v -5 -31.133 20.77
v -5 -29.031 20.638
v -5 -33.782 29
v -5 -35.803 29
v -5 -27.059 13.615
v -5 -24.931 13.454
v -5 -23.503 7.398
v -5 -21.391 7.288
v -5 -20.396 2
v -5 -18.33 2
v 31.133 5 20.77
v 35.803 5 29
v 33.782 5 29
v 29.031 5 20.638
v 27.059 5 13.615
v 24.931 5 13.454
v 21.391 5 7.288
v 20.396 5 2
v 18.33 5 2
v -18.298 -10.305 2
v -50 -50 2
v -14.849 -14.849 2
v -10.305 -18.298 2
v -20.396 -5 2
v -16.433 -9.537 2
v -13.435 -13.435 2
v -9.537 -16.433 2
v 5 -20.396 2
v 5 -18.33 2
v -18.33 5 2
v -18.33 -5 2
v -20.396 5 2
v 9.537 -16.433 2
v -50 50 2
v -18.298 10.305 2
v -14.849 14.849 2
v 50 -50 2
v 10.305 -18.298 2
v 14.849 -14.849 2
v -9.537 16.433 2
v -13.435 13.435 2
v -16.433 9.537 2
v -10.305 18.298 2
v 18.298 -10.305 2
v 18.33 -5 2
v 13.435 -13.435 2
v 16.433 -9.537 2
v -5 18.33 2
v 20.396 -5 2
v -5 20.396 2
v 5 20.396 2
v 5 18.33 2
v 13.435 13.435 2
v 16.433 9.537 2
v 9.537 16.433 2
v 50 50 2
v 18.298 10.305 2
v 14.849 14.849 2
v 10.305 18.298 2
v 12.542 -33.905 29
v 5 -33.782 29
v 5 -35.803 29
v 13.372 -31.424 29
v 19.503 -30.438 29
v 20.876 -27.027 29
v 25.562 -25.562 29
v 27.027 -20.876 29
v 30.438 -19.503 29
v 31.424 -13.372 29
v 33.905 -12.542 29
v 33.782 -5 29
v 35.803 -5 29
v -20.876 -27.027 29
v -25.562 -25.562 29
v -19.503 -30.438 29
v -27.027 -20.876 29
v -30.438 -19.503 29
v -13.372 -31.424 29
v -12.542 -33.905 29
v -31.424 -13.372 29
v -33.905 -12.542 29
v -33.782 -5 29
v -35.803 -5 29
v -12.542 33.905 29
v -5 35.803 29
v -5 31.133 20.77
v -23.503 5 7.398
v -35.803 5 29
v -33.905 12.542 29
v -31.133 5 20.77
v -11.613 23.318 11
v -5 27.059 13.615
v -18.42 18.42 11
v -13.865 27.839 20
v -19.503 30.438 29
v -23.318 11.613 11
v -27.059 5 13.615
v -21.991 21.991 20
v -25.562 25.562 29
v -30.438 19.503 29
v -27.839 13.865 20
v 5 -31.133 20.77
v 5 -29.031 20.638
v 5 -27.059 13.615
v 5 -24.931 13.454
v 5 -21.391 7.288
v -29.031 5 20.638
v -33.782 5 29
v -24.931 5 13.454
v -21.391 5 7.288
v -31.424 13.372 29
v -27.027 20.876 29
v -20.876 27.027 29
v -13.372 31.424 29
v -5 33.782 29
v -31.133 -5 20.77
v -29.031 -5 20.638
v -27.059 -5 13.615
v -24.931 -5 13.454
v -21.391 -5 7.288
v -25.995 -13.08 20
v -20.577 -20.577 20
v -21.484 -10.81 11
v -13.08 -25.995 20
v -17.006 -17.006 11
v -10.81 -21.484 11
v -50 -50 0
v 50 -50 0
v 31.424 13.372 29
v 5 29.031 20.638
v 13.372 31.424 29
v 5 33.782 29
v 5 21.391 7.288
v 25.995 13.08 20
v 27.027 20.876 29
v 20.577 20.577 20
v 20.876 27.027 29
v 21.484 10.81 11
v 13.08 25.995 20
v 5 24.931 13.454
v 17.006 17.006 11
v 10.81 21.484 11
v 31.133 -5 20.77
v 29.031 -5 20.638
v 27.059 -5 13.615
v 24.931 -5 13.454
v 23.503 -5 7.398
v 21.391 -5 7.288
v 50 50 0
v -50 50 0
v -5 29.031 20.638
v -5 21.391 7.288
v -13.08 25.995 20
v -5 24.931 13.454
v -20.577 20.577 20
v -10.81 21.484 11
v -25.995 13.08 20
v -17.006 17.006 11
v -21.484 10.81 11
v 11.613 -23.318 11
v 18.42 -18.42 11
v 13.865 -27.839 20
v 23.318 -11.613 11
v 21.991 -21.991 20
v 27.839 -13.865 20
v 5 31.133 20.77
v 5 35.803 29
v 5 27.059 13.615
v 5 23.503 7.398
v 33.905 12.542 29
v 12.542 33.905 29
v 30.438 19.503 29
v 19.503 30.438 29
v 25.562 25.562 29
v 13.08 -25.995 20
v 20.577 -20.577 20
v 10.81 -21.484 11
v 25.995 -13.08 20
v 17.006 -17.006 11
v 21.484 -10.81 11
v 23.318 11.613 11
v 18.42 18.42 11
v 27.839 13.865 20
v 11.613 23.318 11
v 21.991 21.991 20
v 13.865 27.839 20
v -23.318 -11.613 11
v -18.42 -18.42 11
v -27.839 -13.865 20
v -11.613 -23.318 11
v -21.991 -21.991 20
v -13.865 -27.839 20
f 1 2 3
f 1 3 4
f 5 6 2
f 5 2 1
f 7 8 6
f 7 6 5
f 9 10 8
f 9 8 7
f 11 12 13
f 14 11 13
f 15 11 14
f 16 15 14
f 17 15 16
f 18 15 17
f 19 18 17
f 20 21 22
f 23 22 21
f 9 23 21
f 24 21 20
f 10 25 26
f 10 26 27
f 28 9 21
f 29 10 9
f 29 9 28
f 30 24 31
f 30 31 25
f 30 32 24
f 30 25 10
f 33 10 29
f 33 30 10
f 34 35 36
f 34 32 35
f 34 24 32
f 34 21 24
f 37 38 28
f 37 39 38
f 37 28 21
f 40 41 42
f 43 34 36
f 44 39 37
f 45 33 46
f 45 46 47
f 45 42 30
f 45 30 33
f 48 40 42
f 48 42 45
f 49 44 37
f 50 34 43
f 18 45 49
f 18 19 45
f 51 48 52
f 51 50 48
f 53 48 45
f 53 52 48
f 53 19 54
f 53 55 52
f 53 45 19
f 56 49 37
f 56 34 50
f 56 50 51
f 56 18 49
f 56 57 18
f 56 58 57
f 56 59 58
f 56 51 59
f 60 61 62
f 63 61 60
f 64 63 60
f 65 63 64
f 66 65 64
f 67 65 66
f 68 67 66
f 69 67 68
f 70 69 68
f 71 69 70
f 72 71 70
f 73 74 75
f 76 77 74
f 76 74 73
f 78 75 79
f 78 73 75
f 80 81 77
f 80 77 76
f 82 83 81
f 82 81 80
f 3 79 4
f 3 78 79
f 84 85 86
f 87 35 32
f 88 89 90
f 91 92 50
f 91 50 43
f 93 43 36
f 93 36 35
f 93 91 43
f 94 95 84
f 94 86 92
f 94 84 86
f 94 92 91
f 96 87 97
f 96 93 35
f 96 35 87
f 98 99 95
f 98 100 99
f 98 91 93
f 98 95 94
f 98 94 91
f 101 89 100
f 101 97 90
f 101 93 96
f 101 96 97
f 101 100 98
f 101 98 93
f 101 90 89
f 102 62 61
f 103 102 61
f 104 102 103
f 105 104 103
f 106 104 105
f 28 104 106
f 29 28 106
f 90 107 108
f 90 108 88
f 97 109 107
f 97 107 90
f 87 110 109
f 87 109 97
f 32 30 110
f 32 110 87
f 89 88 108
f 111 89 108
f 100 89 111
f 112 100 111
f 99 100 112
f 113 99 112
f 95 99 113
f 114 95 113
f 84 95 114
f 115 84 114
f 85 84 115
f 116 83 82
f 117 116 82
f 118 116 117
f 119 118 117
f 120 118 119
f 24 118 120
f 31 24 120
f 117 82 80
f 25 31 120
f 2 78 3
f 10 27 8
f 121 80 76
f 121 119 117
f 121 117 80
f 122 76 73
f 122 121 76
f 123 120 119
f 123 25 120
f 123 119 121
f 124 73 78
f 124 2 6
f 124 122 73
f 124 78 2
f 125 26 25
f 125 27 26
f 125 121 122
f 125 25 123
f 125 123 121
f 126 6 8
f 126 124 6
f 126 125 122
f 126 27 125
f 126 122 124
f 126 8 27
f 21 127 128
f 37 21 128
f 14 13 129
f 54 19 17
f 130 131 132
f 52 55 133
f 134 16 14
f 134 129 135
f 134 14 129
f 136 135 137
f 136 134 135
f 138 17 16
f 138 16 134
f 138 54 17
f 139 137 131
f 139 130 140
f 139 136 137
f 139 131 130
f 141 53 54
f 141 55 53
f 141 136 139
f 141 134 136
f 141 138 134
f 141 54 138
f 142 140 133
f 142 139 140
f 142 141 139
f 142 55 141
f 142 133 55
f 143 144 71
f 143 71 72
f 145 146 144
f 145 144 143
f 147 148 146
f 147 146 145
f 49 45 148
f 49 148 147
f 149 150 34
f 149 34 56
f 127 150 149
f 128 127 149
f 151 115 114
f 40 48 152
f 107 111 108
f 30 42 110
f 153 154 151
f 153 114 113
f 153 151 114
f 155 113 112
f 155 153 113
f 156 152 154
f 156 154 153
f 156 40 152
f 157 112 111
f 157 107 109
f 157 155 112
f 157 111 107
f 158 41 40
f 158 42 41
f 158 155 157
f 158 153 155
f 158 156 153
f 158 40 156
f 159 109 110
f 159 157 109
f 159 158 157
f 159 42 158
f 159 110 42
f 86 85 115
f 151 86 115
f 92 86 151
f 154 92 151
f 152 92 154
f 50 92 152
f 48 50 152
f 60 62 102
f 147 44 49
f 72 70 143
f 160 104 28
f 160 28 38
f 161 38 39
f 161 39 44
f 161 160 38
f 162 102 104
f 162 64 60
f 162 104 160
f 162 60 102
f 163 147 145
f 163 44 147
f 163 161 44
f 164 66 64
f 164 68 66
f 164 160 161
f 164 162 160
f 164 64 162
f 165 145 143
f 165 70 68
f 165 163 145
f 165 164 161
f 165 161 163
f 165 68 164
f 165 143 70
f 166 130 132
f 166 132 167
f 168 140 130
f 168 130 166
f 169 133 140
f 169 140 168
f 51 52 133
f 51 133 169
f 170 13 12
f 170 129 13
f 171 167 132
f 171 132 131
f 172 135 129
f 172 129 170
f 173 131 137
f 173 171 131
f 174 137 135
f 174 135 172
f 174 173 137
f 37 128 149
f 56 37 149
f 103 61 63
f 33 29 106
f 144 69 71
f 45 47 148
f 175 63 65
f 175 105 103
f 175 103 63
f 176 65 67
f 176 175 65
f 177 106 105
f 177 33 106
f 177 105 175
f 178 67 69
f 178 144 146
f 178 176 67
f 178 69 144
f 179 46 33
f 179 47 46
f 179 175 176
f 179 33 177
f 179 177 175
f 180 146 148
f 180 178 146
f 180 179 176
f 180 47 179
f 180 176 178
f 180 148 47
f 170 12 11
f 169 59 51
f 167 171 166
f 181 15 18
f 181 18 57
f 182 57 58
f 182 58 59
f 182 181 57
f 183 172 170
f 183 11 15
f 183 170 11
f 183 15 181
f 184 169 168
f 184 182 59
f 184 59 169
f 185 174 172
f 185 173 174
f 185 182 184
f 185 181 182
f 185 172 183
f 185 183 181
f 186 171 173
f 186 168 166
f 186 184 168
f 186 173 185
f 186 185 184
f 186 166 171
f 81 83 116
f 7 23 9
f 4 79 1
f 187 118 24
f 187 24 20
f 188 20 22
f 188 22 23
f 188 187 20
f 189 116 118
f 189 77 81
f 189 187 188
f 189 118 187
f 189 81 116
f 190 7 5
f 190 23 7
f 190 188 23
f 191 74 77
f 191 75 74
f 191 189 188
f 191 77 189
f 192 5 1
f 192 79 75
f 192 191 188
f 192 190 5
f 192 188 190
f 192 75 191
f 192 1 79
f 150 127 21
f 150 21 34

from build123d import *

# Parameters (mm, degrees)
F4_DEPTH      = 30
F4_DEPTH_BACK = -2
F5_W          = 100
F5_H          = 100
F6_DEPTH      = 2


with BuildPart() as f2:
    # F0 (on Front) → F2 (revolve)
    with BuildSketch(Plane.XZ):
        Polygon((0, 2), (0, 0), (19.877748, 0), (36.150404, 29), (34.150404, 29), (19, 2), align=None)
    revolve(axis=Axis((0, 0, 10.899935), (0, 0, 1)))

    # F3 (on Top) → F4 (cut, two sides)
    with BuildSketch(Plane.XY) as f4_sk:
        Polygon((-72.002242, 5), (-72.002242, 0), (-72.002242, -5), (-5, -5), (-5, -72.002242), (0, -72.002242), (5, -72.002242), (5, -5), (72.002242, -5), (72.002242, 0), (72.002242, 5), (5, 5), (5, 72.002242), (0, 72.002242), (-5, 72.002242), (-5, 5), align=None)
    extrude(amount=F4_DEPTH, mode=Mode.SUBTRACT)
    extrude(f4_sk.sketch, amount=-F4_DEPTH_BACK, mode=Mode.SUBTRACT)

    # F5 (on Top) → F6 (join)
    with BuildSketch(Plane.XY):
        Rectangle(F5_W, F5_H)
    extrude(amount=F6_DEPTH)


solid = f2.part
